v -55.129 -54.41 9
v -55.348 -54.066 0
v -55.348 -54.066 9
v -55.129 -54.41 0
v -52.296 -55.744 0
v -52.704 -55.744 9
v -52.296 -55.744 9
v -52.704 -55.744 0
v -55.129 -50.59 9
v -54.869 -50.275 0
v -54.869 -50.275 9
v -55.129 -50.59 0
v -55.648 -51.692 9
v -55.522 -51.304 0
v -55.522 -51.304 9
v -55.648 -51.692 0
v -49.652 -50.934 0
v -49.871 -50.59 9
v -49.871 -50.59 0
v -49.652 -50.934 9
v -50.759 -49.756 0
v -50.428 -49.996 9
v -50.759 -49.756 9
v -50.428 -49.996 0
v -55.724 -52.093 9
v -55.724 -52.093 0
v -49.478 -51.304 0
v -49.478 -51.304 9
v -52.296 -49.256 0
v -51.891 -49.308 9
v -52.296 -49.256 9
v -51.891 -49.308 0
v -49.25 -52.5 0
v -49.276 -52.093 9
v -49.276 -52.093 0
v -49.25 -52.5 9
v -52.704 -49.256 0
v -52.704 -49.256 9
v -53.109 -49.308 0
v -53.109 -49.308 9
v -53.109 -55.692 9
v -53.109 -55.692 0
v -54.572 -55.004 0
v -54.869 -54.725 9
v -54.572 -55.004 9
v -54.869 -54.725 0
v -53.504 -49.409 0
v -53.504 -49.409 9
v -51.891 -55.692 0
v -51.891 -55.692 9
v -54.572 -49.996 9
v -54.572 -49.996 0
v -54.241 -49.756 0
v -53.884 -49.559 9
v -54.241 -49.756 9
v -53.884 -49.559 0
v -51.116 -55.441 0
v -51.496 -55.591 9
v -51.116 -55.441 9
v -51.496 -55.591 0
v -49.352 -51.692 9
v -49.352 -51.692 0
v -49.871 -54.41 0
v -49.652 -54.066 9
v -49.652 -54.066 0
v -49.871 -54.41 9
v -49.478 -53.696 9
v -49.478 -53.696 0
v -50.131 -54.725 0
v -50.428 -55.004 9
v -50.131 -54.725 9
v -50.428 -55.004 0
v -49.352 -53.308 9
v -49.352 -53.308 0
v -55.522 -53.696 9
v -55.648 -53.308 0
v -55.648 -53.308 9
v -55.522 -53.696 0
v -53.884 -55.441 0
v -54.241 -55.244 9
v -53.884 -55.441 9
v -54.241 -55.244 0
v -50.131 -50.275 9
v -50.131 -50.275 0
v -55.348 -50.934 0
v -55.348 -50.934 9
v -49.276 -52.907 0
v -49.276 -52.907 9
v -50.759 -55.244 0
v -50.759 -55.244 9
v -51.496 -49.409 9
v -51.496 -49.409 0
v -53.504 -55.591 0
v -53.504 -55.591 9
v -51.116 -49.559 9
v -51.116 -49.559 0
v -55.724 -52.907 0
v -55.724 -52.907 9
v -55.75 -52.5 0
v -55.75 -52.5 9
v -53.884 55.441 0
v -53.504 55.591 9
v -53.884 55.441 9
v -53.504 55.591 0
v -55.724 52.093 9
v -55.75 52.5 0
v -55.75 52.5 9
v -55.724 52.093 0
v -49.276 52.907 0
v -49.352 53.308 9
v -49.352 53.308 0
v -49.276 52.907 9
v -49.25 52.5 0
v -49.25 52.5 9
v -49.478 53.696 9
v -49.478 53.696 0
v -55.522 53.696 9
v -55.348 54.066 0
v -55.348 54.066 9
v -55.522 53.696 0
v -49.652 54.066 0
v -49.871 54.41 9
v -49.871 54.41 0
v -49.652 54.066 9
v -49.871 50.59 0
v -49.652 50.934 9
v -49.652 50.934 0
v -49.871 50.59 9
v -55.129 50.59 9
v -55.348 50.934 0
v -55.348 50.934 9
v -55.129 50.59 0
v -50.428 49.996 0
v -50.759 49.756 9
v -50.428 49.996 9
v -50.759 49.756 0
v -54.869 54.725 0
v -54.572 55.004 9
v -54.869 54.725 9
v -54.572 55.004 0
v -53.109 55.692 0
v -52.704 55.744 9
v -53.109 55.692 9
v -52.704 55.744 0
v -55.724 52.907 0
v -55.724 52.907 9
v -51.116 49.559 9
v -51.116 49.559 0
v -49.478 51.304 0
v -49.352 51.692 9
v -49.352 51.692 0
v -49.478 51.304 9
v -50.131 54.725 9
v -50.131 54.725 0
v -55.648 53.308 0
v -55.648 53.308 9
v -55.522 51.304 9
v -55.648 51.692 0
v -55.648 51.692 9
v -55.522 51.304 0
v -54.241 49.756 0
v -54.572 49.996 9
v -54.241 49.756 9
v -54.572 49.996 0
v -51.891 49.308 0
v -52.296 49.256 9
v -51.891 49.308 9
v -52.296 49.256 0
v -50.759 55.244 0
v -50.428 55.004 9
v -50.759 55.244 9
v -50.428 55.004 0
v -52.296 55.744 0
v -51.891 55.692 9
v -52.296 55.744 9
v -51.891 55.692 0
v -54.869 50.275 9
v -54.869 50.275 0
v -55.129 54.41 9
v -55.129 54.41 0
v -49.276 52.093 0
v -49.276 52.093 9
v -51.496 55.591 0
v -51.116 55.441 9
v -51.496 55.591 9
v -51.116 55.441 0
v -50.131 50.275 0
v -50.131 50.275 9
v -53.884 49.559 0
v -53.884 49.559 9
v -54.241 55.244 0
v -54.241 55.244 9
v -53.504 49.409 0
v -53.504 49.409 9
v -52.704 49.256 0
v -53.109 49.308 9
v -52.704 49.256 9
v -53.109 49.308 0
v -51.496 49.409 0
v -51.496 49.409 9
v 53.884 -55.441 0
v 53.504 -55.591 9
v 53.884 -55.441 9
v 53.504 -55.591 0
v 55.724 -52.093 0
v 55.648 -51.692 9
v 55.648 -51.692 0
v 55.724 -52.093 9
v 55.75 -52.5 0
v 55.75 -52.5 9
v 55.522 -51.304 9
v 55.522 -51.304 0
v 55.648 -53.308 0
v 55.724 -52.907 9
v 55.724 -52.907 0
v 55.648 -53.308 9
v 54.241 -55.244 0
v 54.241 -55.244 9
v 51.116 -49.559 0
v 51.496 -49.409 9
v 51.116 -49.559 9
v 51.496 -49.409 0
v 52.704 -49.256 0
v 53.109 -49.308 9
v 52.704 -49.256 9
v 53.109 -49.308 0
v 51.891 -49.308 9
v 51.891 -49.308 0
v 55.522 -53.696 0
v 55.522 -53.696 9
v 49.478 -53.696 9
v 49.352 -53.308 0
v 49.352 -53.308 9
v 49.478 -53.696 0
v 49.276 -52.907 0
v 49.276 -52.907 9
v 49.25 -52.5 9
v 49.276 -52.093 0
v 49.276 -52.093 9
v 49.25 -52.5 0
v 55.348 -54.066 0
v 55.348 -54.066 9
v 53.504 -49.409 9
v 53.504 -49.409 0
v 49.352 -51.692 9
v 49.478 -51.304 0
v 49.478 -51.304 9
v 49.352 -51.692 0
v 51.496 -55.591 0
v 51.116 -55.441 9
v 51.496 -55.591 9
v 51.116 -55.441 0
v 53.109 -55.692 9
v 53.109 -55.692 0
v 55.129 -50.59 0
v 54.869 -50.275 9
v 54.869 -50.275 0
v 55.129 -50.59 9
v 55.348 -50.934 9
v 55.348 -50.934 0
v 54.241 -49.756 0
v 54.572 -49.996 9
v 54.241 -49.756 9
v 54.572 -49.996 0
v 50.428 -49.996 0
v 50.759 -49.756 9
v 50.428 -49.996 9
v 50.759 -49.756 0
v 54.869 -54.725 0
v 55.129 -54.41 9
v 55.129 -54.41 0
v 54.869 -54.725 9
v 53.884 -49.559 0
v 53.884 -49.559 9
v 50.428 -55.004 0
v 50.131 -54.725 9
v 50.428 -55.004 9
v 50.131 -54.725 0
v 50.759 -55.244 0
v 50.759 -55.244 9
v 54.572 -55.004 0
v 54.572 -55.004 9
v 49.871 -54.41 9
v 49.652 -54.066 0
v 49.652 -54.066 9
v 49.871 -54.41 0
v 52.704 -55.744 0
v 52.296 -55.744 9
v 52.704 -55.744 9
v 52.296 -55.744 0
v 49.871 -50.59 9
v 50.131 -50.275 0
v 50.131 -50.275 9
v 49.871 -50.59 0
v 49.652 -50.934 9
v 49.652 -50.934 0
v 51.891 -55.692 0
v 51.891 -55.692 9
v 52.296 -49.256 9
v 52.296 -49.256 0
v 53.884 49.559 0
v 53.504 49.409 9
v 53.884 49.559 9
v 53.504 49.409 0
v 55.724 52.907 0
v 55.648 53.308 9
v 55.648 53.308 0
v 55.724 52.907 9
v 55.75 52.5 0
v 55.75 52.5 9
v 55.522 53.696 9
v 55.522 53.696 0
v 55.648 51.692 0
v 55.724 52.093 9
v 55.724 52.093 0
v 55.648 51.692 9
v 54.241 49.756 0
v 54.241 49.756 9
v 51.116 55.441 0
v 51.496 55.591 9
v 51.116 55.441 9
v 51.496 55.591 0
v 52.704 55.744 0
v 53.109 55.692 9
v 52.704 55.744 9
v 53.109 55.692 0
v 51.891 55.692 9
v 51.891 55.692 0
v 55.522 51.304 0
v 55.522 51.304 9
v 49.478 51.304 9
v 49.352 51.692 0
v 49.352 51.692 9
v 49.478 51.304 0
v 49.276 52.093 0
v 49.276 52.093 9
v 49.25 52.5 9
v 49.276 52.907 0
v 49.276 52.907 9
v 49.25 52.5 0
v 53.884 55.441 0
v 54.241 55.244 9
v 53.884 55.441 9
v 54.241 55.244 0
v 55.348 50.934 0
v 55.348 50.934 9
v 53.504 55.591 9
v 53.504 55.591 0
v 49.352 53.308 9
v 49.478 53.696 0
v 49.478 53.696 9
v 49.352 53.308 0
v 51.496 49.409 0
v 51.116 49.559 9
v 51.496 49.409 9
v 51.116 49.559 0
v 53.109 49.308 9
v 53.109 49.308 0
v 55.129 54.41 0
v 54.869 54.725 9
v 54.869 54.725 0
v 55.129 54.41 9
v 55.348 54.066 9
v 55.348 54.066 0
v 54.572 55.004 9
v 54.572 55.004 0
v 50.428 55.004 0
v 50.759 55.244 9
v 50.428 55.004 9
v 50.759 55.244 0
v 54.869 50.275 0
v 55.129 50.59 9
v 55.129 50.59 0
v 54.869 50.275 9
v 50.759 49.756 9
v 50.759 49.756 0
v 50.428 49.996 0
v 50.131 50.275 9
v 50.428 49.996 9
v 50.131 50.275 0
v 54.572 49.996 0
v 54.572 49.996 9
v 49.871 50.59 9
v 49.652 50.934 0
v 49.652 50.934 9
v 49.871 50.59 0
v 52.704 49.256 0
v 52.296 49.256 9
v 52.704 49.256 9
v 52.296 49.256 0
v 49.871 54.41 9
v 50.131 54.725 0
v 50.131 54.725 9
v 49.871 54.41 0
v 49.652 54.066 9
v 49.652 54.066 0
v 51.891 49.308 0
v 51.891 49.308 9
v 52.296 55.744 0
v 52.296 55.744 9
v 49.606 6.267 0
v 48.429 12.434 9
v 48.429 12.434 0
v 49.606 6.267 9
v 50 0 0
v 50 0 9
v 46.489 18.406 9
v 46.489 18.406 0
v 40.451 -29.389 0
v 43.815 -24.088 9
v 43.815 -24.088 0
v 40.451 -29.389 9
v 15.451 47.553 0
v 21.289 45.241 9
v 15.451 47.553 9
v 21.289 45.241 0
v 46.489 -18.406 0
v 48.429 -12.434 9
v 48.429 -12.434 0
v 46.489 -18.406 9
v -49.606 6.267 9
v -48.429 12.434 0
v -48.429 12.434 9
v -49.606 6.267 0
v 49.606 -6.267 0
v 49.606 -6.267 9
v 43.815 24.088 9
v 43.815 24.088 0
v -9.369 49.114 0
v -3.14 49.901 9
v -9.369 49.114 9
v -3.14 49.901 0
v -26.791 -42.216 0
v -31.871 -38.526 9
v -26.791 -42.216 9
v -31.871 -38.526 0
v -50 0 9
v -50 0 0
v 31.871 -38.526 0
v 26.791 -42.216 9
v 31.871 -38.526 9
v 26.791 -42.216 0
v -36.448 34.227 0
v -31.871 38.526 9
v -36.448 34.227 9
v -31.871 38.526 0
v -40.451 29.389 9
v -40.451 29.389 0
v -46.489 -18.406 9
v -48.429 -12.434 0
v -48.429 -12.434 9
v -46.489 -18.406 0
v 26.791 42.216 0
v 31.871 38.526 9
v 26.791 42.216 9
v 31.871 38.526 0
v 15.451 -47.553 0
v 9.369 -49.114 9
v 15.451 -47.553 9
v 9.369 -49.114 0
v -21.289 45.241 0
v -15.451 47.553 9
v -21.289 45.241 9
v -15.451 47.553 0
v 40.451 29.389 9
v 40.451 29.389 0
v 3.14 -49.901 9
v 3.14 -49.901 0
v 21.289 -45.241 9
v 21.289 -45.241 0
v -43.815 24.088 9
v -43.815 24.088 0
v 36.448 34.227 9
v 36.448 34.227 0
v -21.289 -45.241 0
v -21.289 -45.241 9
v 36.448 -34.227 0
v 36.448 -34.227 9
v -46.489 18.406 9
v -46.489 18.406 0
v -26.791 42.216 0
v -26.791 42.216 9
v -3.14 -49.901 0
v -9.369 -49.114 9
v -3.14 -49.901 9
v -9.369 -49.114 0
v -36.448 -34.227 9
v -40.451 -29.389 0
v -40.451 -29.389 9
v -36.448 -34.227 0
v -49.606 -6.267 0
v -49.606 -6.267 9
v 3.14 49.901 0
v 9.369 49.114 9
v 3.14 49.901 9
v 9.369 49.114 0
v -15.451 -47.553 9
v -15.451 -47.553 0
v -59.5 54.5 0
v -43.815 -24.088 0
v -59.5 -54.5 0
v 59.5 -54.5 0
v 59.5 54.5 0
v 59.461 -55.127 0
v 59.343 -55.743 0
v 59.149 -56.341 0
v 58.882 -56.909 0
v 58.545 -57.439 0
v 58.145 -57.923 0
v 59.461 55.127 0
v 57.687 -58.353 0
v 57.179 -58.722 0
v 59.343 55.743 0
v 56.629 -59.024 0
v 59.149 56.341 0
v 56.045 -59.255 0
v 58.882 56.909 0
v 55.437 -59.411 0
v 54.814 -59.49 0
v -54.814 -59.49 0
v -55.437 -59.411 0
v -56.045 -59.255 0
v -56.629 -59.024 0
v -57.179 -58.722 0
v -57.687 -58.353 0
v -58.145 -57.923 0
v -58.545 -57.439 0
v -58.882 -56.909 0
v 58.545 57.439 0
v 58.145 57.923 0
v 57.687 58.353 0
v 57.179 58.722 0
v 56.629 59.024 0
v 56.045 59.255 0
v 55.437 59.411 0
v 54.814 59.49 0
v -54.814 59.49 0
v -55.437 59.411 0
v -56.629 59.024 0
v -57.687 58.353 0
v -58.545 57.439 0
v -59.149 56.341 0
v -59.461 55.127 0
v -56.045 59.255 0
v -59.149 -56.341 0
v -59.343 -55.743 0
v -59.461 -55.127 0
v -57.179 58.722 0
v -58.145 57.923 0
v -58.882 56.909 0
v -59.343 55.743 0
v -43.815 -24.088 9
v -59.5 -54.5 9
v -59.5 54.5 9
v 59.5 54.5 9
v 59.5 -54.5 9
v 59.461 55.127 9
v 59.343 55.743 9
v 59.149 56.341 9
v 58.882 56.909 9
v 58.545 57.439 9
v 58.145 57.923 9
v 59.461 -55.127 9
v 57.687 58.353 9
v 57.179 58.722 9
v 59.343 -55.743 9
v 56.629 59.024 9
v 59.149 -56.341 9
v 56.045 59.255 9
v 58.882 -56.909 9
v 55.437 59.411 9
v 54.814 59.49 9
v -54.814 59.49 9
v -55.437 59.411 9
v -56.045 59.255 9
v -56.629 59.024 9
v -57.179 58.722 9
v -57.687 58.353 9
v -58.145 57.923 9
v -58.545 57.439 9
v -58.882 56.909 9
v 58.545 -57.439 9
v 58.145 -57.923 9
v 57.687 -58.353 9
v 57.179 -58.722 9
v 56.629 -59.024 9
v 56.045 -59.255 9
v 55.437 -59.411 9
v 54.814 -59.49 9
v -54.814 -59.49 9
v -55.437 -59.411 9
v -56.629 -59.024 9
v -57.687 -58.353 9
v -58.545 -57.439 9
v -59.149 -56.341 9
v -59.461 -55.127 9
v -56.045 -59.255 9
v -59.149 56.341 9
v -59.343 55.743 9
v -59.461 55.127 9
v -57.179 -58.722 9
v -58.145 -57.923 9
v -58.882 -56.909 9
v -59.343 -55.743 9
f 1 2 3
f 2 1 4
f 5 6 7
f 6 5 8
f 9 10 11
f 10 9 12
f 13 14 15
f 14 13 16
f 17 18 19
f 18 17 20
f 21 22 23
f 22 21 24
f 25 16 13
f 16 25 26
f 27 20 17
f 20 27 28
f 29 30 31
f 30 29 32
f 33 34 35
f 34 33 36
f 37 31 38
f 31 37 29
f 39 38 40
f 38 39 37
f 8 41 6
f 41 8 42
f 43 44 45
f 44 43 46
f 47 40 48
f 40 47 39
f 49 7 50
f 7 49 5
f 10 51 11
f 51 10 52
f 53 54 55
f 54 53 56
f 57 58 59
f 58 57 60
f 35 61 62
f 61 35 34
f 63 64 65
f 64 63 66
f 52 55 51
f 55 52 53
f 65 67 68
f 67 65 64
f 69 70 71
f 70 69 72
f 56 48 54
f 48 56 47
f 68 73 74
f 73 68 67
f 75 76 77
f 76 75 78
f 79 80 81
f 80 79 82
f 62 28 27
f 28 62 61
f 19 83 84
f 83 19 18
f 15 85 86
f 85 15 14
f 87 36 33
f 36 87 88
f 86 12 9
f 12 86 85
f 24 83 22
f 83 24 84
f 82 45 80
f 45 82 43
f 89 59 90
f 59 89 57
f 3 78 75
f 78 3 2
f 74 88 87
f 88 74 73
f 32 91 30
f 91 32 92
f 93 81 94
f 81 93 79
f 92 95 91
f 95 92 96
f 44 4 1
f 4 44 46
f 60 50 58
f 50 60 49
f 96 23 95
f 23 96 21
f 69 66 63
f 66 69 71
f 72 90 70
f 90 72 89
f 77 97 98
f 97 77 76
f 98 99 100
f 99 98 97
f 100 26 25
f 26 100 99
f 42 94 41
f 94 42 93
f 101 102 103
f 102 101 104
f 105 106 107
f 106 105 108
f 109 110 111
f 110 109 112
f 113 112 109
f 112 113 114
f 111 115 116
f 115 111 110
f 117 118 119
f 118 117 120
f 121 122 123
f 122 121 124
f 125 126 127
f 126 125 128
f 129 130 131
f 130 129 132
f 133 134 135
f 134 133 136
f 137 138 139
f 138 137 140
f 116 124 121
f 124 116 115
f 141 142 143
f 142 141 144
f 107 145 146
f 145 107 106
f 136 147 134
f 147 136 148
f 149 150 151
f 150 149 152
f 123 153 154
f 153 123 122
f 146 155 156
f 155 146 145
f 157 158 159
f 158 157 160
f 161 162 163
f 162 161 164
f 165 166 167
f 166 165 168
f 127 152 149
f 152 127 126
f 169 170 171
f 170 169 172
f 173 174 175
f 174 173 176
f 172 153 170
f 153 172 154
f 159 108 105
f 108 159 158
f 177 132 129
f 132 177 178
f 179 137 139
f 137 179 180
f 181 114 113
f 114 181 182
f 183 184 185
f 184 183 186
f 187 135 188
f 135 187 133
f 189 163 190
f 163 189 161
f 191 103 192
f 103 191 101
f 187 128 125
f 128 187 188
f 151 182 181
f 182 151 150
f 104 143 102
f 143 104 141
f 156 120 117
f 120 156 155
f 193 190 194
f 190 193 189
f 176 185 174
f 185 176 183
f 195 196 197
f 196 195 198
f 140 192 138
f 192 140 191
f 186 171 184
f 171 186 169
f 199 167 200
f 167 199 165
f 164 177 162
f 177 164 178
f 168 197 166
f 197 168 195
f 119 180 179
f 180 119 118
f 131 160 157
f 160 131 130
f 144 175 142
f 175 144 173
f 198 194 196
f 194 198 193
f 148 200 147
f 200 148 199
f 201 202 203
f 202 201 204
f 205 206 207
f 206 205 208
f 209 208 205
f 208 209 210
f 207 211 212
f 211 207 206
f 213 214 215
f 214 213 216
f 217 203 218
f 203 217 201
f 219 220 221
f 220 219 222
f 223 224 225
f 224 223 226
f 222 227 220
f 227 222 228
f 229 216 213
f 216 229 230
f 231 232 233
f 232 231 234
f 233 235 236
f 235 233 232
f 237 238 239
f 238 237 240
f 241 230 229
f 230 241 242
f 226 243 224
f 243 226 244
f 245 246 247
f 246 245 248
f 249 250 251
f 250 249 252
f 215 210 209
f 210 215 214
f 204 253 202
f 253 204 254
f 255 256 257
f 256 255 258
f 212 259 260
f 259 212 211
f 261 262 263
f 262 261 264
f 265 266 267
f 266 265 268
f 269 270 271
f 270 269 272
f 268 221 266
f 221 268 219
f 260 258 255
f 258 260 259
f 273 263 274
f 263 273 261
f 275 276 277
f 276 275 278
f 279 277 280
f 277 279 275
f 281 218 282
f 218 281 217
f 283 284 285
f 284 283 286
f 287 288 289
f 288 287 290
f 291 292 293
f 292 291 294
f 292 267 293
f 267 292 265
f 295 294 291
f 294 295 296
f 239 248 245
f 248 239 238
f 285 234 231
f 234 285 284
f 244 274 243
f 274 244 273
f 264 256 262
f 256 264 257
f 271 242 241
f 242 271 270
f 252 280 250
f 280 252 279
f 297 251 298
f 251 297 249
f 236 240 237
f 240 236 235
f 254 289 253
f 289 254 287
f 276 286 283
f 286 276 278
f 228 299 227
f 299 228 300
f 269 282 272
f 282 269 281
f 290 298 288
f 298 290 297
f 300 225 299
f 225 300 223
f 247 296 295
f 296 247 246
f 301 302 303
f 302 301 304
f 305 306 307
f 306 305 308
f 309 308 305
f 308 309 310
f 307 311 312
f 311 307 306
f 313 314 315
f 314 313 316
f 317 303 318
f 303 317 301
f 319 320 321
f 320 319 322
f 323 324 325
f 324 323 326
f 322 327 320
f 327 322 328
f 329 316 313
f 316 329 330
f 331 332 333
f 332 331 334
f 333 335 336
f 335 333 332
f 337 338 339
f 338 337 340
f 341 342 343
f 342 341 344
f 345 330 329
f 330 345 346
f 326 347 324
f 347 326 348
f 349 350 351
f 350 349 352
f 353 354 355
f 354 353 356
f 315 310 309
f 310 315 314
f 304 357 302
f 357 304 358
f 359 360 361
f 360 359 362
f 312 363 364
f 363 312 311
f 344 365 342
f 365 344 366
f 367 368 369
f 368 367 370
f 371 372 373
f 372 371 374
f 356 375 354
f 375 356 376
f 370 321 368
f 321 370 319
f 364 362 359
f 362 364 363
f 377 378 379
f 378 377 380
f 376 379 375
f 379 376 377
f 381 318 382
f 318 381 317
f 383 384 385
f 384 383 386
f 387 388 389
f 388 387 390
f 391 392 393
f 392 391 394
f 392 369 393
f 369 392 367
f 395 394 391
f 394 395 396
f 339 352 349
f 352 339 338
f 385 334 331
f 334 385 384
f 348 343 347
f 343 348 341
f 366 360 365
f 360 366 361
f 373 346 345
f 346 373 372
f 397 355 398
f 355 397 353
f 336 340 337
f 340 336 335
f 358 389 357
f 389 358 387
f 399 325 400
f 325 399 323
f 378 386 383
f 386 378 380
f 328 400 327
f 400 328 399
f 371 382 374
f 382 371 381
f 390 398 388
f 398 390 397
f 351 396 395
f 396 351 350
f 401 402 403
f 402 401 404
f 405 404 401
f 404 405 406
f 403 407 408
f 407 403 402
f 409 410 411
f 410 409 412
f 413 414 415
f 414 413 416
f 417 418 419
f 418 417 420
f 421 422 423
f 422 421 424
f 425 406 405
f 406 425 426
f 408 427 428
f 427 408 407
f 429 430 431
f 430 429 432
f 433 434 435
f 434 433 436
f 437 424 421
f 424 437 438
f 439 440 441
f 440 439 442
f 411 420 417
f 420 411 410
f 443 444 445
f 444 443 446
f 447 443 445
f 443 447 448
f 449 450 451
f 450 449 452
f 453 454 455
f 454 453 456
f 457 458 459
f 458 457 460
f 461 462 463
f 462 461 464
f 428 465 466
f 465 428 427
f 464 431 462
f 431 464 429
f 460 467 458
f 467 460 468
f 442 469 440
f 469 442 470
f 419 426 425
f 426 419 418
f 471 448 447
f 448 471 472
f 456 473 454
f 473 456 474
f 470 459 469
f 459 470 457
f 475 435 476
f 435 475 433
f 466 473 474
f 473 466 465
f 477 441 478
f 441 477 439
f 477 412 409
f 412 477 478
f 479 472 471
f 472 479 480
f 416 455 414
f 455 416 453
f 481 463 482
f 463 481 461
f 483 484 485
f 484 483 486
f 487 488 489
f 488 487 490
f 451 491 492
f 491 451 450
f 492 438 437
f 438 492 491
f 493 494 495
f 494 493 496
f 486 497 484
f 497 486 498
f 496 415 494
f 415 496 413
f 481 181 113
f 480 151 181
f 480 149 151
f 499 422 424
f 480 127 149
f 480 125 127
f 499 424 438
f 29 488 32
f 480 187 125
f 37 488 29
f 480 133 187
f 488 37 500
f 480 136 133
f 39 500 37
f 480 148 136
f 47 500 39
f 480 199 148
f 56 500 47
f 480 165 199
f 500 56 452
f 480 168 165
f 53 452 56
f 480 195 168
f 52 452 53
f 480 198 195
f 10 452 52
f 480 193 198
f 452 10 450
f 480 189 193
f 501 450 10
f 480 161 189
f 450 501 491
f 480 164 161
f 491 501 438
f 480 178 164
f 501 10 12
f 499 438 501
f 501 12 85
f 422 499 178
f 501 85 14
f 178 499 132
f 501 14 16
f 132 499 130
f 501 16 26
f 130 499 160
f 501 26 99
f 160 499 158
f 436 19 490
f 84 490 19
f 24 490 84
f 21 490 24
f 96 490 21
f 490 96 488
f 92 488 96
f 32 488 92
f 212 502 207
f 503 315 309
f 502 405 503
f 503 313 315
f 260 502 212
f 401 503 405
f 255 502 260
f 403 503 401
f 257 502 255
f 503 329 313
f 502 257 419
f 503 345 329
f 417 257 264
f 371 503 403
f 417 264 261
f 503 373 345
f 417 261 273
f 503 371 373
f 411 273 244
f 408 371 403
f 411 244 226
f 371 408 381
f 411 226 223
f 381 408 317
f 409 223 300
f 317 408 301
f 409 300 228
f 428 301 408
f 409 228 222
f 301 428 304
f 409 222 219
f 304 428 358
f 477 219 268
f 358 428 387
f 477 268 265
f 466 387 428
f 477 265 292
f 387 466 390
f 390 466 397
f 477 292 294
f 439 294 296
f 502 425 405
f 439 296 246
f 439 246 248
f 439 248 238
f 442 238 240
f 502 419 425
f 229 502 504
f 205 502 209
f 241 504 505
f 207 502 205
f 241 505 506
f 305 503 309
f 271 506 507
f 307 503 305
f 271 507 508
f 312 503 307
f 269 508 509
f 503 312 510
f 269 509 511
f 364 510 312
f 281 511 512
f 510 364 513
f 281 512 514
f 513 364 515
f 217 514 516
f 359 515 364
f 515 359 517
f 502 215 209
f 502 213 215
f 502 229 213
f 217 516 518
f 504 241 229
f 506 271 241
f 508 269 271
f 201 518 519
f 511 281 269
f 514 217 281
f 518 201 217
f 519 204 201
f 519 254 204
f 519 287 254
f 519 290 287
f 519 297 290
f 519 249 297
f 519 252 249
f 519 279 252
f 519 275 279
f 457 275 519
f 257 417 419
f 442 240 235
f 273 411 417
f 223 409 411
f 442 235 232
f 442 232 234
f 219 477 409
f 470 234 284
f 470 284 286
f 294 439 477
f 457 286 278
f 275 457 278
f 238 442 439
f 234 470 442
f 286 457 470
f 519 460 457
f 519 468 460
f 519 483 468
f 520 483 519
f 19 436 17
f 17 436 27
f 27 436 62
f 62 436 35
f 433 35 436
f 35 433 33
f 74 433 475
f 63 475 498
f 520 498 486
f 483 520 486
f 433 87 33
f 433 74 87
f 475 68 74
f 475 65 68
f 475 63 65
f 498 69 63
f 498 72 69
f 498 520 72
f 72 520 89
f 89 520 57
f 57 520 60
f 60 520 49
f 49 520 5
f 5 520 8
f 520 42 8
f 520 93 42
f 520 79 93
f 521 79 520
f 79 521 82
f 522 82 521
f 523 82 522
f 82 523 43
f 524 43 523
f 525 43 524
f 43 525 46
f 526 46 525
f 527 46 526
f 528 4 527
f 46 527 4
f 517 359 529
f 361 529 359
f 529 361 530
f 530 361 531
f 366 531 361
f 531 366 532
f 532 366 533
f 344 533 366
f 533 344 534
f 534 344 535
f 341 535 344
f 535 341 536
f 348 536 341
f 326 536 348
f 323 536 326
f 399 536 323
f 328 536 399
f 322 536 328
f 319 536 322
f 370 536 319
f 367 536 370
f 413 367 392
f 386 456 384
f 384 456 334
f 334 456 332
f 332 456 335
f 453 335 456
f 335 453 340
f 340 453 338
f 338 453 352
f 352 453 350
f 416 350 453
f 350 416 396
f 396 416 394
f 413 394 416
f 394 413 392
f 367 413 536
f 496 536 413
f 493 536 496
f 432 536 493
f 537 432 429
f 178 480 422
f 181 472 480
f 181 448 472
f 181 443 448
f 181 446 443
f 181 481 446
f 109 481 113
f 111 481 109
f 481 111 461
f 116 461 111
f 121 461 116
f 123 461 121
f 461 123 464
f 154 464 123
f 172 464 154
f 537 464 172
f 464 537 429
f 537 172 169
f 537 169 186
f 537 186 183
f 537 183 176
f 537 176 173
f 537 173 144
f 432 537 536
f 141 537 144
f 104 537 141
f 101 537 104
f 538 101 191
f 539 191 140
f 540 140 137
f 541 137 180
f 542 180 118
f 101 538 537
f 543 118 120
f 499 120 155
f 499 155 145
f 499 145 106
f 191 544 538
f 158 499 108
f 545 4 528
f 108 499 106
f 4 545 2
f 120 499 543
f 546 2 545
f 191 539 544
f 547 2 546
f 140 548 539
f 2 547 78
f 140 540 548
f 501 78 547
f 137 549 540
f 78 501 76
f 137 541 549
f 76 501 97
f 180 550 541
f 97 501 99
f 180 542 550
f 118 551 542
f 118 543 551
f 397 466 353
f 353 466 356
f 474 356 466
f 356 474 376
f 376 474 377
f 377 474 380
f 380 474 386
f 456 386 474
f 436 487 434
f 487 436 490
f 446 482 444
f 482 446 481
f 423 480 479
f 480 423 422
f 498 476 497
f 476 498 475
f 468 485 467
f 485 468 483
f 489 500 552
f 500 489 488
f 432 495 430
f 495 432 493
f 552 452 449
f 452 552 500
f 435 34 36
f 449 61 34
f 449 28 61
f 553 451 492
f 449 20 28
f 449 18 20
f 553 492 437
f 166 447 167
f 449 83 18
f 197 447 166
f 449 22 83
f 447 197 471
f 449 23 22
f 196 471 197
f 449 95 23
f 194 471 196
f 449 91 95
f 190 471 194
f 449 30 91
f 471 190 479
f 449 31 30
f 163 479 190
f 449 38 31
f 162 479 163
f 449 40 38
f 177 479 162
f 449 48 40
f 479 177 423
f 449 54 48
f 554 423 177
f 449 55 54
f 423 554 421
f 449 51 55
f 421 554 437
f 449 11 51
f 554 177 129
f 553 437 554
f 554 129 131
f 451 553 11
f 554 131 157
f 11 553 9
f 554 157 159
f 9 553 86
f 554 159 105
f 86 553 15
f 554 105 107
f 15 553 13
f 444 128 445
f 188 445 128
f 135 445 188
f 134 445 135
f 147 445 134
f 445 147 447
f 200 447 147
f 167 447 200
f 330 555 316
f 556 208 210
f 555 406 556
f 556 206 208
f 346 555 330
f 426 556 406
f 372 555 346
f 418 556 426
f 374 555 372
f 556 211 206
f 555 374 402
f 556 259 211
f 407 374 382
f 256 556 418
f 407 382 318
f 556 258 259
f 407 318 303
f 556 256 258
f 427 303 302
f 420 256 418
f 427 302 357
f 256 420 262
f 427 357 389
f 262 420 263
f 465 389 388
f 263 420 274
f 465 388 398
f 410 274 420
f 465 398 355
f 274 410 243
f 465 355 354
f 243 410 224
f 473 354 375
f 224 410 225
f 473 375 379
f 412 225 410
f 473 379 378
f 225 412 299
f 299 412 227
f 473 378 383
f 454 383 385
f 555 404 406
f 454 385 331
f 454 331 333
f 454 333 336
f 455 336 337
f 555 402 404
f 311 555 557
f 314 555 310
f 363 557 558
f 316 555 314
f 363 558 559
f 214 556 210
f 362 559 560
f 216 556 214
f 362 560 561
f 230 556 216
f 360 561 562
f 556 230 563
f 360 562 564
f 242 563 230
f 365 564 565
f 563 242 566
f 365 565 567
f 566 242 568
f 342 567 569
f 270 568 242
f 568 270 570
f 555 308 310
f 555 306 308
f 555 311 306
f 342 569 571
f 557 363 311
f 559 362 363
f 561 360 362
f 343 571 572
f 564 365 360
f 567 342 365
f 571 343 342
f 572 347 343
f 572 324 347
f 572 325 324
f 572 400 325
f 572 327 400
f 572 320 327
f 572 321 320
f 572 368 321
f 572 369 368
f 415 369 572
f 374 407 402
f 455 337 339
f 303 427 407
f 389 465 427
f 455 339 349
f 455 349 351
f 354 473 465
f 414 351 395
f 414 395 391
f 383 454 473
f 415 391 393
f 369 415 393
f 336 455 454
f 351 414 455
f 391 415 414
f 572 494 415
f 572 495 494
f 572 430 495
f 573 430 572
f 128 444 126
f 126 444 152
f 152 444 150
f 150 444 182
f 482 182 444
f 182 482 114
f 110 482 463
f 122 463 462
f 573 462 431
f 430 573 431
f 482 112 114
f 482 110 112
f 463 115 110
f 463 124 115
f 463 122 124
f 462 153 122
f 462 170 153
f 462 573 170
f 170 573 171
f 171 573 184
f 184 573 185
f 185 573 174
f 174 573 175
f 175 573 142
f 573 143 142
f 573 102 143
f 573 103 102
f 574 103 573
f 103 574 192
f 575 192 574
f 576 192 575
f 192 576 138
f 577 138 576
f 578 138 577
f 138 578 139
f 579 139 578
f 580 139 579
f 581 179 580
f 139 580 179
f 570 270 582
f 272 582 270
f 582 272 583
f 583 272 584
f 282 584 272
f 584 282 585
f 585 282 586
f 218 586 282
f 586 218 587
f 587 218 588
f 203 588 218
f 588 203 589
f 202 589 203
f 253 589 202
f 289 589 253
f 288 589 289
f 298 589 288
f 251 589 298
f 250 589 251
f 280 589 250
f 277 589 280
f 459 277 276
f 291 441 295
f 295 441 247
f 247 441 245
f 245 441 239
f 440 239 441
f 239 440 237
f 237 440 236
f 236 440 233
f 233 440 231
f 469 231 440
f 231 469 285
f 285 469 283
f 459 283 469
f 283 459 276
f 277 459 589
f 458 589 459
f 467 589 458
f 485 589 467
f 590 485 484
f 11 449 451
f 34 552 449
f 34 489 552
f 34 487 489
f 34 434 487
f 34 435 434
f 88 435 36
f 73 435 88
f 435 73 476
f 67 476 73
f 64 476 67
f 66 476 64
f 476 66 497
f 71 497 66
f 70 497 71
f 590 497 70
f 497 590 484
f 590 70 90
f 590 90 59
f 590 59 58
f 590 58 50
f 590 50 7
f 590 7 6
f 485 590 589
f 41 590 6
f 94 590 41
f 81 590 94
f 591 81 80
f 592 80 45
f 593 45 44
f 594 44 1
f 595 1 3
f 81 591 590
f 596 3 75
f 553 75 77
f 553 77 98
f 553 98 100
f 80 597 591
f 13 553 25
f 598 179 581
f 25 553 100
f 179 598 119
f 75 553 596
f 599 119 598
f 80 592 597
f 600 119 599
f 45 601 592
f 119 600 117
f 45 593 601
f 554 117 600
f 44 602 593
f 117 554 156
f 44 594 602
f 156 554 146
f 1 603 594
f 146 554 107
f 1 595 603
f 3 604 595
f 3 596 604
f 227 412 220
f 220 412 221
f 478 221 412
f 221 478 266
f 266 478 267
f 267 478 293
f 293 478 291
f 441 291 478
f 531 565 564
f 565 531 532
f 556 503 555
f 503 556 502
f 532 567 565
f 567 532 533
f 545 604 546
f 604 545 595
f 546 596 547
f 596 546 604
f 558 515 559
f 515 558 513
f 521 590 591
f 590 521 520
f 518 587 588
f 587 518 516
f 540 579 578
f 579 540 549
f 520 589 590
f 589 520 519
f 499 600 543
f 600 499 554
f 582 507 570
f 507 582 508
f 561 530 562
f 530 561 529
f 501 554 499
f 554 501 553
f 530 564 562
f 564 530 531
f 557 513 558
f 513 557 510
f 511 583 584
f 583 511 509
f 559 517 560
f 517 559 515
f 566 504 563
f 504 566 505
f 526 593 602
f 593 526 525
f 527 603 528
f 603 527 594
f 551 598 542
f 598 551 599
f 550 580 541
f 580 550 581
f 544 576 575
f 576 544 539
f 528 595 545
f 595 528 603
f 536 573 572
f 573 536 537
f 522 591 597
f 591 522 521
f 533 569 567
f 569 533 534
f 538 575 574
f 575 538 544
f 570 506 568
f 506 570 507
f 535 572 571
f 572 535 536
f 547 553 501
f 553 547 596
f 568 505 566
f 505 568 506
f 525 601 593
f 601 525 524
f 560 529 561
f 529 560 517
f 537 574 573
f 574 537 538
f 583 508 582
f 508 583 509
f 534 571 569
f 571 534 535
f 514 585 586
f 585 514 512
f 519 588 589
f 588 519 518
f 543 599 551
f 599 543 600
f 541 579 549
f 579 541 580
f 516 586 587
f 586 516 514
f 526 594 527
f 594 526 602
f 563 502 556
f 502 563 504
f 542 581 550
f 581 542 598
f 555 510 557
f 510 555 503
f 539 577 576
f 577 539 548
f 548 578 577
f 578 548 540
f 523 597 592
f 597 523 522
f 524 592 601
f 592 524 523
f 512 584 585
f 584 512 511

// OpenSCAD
$fn = 50;


difference() {
	union() {
		hull() {
			translate(v = [-54.5000000000, 54.5000000000, 0]) {
				cylinder(h = 9, r = 5);
			}
			translate(v = [54.5000000000, 54.5000000000, 0]) {
				cylinder(h = 9, r = 5);
			}
			translate(v = [-54.5000000000, -54.5000000000, 0]) {
				cylinder(h = 9, r = 5);
			}
			translate(v = [54.5000000000, -54.5000000000, 0]) {
				cylinder(h = 9, r = 5);
			}
		}
	}
	union() {
		#translate(v = [-52.5000000000, -52.5000000000, -100.0000000000]) {
			cylinder(h = 200, r = 3.2500000000);
		}
		#translate(v = [-52.5000000000, 52.5000000000, -100.0000000000]) {
			cylinder(h = 200, r = 3.2500000000);
		}
		#translate(v = [52.5000000000, -52.5000000000, -100.0000000000]) {
			cylinder(h = 200, r = 3.2500000000);
		}
		#translate(v = [52.5000000000, 52.5000000000, -100.0000000000]) {
			cylinder(h = 200, r = 3.2500000000);
		}
		#cylinder(h = 9, r = 50.0000000000);
	}
}
